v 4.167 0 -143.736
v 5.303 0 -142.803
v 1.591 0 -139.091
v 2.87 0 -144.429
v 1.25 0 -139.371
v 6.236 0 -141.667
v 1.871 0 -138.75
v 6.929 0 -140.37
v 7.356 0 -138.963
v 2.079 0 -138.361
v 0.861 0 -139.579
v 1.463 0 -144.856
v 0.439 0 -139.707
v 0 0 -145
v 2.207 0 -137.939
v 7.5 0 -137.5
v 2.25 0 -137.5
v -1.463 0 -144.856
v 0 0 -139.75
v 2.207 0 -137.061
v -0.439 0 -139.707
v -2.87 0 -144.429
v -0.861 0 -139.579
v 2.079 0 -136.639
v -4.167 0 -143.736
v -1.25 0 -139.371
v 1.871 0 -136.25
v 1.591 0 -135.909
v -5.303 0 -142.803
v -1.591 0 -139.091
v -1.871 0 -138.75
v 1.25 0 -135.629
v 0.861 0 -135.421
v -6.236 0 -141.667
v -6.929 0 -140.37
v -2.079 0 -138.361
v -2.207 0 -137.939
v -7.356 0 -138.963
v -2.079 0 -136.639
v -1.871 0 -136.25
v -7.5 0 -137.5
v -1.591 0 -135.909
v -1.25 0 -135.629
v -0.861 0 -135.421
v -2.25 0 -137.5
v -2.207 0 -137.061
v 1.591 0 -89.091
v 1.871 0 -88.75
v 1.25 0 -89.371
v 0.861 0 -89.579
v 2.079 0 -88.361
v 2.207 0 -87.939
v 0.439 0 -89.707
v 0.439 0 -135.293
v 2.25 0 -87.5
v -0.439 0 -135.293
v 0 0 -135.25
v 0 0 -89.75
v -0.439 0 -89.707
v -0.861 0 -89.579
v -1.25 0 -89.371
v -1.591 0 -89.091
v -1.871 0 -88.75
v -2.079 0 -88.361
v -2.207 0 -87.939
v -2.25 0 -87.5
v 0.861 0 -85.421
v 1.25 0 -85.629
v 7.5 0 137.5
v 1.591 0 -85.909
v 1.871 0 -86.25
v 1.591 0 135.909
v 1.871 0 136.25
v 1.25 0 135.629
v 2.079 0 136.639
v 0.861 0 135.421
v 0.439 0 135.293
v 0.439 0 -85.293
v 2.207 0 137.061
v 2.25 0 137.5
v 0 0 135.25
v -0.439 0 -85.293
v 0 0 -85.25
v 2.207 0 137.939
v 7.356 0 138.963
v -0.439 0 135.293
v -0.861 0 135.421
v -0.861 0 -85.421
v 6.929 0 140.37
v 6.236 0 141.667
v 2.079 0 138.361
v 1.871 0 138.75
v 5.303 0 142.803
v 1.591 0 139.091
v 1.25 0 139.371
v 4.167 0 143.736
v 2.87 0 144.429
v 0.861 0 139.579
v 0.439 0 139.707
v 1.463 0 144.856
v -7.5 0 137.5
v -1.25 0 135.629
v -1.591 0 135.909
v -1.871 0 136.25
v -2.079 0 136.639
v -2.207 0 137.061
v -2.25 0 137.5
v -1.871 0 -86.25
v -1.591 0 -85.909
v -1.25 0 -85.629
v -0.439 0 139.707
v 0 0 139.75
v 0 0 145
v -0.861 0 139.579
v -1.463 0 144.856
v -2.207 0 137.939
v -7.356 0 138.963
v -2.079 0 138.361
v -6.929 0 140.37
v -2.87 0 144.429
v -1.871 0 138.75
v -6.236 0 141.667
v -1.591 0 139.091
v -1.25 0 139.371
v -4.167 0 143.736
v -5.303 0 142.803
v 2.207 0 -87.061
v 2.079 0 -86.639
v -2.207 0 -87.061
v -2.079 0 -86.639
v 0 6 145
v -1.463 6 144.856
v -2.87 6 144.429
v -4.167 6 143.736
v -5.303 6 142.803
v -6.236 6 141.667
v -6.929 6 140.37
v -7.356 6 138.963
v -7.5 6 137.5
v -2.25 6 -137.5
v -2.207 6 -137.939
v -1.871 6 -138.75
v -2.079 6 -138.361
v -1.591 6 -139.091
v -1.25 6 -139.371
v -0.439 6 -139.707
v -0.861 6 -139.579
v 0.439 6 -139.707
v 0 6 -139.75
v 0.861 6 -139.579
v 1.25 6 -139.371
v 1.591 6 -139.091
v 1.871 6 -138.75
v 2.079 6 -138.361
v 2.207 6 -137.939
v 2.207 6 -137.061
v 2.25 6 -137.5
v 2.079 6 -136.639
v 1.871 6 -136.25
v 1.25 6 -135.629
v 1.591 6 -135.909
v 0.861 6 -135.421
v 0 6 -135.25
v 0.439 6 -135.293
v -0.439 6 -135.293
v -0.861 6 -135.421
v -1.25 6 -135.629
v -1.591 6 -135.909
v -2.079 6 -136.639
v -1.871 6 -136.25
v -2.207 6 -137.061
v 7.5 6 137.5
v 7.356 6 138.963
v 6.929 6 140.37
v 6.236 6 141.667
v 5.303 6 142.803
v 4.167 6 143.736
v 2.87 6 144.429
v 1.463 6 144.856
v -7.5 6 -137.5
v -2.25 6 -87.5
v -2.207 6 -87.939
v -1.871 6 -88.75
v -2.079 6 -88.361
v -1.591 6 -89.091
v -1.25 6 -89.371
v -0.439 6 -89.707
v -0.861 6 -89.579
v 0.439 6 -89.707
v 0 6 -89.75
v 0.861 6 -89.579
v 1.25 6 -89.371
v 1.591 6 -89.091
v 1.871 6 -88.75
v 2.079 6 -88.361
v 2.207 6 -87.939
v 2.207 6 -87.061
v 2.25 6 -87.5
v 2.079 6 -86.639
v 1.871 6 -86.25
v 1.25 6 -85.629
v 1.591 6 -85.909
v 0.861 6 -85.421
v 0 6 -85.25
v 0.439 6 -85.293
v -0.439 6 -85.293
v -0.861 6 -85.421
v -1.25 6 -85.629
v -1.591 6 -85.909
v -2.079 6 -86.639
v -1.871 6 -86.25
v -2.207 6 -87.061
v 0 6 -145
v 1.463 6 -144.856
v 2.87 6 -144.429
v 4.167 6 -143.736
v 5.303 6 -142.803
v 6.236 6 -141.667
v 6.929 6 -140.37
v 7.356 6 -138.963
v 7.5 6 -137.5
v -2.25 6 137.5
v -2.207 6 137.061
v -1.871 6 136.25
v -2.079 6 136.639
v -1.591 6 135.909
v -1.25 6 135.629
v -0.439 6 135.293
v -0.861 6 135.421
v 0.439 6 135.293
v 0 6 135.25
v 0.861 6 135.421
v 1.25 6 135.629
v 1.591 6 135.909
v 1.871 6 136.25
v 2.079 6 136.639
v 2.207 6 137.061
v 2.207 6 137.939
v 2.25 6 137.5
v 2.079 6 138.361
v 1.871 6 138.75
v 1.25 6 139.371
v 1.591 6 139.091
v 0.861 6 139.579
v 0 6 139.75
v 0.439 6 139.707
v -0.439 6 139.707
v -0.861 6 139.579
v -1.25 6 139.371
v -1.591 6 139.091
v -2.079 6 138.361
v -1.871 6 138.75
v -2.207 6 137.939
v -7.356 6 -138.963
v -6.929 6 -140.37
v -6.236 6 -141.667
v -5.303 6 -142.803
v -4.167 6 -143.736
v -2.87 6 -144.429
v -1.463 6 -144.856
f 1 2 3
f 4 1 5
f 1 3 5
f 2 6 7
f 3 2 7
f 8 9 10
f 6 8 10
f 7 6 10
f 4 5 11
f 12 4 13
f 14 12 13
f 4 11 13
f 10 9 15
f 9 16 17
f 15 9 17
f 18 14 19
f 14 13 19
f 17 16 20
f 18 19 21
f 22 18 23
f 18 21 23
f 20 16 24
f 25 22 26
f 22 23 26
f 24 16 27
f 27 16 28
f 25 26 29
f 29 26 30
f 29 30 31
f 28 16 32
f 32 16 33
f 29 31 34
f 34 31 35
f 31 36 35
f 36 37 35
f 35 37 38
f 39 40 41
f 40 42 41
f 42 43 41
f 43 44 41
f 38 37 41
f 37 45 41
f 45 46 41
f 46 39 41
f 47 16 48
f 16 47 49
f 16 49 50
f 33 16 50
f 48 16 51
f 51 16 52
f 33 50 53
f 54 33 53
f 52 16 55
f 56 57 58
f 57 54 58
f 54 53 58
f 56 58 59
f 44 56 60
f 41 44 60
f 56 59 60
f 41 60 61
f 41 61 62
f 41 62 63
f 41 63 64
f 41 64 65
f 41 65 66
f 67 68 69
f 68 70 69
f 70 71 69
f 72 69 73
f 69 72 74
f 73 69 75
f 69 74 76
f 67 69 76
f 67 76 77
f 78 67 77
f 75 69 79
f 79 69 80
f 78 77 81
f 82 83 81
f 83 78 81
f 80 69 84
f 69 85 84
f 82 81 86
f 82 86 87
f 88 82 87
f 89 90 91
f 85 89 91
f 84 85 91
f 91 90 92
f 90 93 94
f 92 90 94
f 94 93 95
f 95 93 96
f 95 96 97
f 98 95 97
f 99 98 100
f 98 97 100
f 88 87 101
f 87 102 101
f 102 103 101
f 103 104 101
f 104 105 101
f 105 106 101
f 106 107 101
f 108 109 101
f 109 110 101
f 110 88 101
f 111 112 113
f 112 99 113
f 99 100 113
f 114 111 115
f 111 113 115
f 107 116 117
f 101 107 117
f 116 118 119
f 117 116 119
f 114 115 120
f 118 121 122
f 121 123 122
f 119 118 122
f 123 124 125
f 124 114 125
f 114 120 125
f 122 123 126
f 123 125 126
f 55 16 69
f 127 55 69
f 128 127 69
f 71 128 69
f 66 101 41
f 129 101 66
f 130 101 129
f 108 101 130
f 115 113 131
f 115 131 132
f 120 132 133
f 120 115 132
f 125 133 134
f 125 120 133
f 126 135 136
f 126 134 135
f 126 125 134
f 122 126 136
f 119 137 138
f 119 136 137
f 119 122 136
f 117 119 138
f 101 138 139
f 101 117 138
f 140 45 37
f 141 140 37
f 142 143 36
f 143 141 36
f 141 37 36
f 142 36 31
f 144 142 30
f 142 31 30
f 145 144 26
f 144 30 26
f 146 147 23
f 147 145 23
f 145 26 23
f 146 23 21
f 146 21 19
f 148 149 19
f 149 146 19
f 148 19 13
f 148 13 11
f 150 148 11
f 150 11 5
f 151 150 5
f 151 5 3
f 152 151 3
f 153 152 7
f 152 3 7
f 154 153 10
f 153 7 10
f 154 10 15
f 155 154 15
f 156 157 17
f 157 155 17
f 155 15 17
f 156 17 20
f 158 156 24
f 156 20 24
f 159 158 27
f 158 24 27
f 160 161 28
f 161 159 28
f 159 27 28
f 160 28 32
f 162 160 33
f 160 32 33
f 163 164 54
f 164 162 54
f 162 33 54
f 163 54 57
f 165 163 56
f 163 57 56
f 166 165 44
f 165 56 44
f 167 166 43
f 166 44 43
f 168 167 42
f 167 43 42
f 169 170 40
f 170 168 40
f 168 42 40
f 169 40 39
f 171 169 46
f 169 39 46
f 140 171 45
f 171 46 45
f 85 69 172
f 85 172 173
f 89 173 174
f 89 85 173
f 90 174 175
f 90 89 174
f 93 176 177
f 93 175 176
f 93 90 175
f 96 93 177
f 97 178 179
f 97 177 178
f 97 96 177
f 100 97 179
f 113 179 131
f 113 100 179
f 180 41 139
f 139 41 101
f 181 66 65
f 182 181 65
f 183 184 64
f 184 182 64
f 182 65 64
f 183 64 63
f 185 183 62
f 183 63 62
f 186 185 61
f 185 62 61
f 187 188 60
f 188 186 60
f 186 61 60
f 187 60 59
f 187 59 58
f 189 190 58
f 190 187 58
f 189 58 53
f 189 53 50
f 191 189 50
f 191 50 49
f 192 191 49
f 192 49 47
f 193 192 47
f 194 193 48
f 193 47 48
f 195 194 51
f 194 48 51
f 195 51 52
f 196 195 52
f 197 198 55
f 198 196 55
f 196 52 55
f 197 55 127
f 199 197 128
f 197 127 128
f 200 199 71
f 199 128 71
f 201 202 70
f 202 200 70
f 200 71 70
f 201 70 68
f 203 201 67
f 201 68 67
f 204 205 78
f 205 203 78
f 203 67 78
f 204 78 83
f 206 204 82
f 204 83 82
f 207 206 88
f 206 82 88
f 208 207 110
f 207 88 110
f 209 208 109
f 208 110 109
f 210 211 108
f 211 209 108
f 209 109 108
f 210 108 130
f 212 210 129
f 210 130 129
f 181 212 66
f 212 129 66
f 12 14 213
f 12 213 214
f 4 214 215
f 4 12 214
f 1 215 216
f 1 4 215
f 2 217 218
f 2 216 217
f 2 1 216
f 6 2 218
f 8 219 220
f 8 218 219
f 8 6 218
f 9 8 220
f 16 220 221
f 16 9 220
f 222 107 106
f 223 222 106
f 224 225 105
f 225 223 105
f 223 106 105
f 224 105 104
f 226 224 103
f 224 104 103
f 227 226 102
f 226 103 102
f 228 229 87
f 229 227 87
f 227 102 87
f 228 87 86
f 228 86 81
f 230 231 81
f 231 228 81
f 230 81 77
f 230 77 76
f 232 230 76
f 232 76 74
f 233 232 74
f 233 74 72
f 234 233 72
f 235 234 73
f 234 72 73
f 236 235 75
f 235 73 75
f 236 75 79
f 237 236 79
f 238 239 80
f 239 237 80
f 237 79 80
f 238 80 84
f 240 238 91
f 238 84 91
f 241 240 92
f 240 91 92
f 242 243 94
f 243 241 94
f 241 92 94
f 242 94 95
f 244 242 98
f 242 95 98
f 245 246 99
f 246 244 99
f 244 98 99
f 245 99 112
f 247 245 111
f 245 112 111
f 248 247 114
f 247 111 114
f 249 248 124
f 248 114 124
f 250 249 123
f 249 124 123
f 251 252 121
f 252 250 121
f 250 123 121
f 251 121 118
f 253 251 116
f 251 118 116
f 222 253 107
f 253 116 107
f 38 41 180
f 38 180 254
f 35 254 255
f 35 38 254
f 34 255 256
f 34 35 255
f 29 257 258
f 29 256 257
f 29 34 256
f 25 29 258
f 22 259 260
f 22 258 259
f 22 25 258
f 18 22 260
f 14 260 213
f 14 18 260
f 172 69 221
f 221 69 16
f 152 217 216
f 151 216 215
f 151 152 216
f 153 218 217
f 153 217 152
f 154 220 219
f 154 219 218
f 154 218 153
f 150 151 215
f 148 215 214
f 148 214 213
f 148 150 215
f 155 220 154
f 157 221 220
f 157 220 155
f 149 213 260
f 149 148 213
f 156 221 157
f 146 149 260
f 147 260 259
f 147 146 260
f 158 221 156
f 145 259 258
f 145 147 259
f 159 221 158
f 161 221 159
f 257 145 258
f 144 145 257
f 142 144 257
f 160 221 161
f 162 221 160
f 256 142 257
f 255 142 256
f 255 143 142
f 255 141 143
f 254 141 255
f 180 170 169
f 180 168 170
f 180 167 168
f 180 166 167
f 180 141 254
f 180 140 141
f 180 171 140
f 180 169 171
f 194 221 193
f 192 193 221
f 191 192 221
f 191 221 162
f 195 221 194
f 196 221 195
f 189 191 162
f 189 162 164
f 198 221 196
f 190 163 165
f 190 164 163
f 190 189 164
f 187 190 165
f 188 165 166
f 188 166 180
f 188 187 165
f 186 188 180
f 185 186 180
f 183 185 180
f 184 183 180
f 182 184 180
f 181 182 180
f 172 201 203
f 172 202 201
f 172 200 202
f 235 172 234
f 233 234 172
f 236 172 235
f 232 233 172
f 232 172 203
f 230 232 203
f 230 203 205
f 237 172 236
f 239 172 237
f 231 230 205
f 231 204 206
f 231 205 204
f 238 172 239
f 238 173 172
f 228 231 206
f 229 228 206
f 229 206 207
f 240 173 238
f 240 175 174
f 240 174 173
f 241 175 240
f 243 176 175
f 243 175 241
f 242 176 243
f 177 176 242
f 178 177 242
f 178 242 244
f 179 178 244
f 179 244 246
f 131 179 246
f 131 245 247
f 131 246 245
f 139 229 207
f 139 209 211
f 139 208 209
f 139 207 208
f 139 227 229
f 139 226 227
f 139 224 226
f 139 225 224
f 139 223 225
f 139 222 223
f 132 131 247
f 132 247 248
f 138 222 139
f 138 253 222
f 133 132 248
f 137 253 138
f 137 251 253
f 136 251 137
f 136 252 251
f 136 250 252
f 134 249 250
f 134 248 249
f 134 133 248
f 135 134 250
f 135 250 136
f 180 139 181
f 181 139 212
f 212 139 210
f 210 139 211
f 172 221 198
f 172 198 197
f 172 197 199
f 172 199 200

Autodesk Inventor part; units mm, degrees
ref_plane "YZ Plane" through (0, 0, 0) normal (1, 0, 0) x (0, 1, 0)
ref_plane "XZ Plane" through (0, 0, 0) normal (0, 1, 0) x (-1, 0, 0)
ref_plane "XY Plane" through (0, 0, 0) normal (0, 0, 1) x (1, 0, 0)
sketch "Szkic3" plane through (0, 0, 0) normal (0, 1, 0) x (-1, 0, 0)
  line L0 (0, -145) -> (0, -145)
  line L1 (7.5, -137.5) -> (7.5, 137.5)
  line L2 (0, 145) -> (0, 145)
  line L3 (-7.5, 137.5) -> (-7.5, -137.5)
  circle A0 centre (0, 137.5) radius 2.25
  circle A1 centre (0, -137.5) radius 2.25
  circle A2 centre (0, -87.5) radius 2.25
  arc A3 (7.5, 137.5) -> (0, 145) centre (0, 137.5) ccw
  arc A4 (0, 145) -> (-7.5, 137.5) centre (0, 137.5) ccw
  arc A5 (0, -145) -> (7.5, -137.5) centre (0, -137.5) ccw
  arc A6 (-7.5, -137.5) -> (0, -145) centre (0, -137.5) ccw
  point P0 (0, 0)
  point P1 (7.5, 145)
  point P2 (7.5, -145)
  point P3 (-7.5, 145)
  point P4 (0, 145)
  point P5 (7.1121, 137.5)
  point P6 (-7.1121, 137.5)
  point P7 (7.1121, -137.5)
  point P8 (0, -145)
  point P9 (-7.1121, -137.5)
  point P10 (0, 145)
  dimension "d11" = 15
  dimension "d12" = 290
  dimension "d13" = 4.5
  dimension "d14" = 4.5
  dimension "d15" = 4.5
  dimension "d16" = 7.5
  dimension "d17" = 7.5
extrude "Wyciągnięcie proste2" add sketch "Szkic3" along normal blind 6
properties part number "GraspArm"
